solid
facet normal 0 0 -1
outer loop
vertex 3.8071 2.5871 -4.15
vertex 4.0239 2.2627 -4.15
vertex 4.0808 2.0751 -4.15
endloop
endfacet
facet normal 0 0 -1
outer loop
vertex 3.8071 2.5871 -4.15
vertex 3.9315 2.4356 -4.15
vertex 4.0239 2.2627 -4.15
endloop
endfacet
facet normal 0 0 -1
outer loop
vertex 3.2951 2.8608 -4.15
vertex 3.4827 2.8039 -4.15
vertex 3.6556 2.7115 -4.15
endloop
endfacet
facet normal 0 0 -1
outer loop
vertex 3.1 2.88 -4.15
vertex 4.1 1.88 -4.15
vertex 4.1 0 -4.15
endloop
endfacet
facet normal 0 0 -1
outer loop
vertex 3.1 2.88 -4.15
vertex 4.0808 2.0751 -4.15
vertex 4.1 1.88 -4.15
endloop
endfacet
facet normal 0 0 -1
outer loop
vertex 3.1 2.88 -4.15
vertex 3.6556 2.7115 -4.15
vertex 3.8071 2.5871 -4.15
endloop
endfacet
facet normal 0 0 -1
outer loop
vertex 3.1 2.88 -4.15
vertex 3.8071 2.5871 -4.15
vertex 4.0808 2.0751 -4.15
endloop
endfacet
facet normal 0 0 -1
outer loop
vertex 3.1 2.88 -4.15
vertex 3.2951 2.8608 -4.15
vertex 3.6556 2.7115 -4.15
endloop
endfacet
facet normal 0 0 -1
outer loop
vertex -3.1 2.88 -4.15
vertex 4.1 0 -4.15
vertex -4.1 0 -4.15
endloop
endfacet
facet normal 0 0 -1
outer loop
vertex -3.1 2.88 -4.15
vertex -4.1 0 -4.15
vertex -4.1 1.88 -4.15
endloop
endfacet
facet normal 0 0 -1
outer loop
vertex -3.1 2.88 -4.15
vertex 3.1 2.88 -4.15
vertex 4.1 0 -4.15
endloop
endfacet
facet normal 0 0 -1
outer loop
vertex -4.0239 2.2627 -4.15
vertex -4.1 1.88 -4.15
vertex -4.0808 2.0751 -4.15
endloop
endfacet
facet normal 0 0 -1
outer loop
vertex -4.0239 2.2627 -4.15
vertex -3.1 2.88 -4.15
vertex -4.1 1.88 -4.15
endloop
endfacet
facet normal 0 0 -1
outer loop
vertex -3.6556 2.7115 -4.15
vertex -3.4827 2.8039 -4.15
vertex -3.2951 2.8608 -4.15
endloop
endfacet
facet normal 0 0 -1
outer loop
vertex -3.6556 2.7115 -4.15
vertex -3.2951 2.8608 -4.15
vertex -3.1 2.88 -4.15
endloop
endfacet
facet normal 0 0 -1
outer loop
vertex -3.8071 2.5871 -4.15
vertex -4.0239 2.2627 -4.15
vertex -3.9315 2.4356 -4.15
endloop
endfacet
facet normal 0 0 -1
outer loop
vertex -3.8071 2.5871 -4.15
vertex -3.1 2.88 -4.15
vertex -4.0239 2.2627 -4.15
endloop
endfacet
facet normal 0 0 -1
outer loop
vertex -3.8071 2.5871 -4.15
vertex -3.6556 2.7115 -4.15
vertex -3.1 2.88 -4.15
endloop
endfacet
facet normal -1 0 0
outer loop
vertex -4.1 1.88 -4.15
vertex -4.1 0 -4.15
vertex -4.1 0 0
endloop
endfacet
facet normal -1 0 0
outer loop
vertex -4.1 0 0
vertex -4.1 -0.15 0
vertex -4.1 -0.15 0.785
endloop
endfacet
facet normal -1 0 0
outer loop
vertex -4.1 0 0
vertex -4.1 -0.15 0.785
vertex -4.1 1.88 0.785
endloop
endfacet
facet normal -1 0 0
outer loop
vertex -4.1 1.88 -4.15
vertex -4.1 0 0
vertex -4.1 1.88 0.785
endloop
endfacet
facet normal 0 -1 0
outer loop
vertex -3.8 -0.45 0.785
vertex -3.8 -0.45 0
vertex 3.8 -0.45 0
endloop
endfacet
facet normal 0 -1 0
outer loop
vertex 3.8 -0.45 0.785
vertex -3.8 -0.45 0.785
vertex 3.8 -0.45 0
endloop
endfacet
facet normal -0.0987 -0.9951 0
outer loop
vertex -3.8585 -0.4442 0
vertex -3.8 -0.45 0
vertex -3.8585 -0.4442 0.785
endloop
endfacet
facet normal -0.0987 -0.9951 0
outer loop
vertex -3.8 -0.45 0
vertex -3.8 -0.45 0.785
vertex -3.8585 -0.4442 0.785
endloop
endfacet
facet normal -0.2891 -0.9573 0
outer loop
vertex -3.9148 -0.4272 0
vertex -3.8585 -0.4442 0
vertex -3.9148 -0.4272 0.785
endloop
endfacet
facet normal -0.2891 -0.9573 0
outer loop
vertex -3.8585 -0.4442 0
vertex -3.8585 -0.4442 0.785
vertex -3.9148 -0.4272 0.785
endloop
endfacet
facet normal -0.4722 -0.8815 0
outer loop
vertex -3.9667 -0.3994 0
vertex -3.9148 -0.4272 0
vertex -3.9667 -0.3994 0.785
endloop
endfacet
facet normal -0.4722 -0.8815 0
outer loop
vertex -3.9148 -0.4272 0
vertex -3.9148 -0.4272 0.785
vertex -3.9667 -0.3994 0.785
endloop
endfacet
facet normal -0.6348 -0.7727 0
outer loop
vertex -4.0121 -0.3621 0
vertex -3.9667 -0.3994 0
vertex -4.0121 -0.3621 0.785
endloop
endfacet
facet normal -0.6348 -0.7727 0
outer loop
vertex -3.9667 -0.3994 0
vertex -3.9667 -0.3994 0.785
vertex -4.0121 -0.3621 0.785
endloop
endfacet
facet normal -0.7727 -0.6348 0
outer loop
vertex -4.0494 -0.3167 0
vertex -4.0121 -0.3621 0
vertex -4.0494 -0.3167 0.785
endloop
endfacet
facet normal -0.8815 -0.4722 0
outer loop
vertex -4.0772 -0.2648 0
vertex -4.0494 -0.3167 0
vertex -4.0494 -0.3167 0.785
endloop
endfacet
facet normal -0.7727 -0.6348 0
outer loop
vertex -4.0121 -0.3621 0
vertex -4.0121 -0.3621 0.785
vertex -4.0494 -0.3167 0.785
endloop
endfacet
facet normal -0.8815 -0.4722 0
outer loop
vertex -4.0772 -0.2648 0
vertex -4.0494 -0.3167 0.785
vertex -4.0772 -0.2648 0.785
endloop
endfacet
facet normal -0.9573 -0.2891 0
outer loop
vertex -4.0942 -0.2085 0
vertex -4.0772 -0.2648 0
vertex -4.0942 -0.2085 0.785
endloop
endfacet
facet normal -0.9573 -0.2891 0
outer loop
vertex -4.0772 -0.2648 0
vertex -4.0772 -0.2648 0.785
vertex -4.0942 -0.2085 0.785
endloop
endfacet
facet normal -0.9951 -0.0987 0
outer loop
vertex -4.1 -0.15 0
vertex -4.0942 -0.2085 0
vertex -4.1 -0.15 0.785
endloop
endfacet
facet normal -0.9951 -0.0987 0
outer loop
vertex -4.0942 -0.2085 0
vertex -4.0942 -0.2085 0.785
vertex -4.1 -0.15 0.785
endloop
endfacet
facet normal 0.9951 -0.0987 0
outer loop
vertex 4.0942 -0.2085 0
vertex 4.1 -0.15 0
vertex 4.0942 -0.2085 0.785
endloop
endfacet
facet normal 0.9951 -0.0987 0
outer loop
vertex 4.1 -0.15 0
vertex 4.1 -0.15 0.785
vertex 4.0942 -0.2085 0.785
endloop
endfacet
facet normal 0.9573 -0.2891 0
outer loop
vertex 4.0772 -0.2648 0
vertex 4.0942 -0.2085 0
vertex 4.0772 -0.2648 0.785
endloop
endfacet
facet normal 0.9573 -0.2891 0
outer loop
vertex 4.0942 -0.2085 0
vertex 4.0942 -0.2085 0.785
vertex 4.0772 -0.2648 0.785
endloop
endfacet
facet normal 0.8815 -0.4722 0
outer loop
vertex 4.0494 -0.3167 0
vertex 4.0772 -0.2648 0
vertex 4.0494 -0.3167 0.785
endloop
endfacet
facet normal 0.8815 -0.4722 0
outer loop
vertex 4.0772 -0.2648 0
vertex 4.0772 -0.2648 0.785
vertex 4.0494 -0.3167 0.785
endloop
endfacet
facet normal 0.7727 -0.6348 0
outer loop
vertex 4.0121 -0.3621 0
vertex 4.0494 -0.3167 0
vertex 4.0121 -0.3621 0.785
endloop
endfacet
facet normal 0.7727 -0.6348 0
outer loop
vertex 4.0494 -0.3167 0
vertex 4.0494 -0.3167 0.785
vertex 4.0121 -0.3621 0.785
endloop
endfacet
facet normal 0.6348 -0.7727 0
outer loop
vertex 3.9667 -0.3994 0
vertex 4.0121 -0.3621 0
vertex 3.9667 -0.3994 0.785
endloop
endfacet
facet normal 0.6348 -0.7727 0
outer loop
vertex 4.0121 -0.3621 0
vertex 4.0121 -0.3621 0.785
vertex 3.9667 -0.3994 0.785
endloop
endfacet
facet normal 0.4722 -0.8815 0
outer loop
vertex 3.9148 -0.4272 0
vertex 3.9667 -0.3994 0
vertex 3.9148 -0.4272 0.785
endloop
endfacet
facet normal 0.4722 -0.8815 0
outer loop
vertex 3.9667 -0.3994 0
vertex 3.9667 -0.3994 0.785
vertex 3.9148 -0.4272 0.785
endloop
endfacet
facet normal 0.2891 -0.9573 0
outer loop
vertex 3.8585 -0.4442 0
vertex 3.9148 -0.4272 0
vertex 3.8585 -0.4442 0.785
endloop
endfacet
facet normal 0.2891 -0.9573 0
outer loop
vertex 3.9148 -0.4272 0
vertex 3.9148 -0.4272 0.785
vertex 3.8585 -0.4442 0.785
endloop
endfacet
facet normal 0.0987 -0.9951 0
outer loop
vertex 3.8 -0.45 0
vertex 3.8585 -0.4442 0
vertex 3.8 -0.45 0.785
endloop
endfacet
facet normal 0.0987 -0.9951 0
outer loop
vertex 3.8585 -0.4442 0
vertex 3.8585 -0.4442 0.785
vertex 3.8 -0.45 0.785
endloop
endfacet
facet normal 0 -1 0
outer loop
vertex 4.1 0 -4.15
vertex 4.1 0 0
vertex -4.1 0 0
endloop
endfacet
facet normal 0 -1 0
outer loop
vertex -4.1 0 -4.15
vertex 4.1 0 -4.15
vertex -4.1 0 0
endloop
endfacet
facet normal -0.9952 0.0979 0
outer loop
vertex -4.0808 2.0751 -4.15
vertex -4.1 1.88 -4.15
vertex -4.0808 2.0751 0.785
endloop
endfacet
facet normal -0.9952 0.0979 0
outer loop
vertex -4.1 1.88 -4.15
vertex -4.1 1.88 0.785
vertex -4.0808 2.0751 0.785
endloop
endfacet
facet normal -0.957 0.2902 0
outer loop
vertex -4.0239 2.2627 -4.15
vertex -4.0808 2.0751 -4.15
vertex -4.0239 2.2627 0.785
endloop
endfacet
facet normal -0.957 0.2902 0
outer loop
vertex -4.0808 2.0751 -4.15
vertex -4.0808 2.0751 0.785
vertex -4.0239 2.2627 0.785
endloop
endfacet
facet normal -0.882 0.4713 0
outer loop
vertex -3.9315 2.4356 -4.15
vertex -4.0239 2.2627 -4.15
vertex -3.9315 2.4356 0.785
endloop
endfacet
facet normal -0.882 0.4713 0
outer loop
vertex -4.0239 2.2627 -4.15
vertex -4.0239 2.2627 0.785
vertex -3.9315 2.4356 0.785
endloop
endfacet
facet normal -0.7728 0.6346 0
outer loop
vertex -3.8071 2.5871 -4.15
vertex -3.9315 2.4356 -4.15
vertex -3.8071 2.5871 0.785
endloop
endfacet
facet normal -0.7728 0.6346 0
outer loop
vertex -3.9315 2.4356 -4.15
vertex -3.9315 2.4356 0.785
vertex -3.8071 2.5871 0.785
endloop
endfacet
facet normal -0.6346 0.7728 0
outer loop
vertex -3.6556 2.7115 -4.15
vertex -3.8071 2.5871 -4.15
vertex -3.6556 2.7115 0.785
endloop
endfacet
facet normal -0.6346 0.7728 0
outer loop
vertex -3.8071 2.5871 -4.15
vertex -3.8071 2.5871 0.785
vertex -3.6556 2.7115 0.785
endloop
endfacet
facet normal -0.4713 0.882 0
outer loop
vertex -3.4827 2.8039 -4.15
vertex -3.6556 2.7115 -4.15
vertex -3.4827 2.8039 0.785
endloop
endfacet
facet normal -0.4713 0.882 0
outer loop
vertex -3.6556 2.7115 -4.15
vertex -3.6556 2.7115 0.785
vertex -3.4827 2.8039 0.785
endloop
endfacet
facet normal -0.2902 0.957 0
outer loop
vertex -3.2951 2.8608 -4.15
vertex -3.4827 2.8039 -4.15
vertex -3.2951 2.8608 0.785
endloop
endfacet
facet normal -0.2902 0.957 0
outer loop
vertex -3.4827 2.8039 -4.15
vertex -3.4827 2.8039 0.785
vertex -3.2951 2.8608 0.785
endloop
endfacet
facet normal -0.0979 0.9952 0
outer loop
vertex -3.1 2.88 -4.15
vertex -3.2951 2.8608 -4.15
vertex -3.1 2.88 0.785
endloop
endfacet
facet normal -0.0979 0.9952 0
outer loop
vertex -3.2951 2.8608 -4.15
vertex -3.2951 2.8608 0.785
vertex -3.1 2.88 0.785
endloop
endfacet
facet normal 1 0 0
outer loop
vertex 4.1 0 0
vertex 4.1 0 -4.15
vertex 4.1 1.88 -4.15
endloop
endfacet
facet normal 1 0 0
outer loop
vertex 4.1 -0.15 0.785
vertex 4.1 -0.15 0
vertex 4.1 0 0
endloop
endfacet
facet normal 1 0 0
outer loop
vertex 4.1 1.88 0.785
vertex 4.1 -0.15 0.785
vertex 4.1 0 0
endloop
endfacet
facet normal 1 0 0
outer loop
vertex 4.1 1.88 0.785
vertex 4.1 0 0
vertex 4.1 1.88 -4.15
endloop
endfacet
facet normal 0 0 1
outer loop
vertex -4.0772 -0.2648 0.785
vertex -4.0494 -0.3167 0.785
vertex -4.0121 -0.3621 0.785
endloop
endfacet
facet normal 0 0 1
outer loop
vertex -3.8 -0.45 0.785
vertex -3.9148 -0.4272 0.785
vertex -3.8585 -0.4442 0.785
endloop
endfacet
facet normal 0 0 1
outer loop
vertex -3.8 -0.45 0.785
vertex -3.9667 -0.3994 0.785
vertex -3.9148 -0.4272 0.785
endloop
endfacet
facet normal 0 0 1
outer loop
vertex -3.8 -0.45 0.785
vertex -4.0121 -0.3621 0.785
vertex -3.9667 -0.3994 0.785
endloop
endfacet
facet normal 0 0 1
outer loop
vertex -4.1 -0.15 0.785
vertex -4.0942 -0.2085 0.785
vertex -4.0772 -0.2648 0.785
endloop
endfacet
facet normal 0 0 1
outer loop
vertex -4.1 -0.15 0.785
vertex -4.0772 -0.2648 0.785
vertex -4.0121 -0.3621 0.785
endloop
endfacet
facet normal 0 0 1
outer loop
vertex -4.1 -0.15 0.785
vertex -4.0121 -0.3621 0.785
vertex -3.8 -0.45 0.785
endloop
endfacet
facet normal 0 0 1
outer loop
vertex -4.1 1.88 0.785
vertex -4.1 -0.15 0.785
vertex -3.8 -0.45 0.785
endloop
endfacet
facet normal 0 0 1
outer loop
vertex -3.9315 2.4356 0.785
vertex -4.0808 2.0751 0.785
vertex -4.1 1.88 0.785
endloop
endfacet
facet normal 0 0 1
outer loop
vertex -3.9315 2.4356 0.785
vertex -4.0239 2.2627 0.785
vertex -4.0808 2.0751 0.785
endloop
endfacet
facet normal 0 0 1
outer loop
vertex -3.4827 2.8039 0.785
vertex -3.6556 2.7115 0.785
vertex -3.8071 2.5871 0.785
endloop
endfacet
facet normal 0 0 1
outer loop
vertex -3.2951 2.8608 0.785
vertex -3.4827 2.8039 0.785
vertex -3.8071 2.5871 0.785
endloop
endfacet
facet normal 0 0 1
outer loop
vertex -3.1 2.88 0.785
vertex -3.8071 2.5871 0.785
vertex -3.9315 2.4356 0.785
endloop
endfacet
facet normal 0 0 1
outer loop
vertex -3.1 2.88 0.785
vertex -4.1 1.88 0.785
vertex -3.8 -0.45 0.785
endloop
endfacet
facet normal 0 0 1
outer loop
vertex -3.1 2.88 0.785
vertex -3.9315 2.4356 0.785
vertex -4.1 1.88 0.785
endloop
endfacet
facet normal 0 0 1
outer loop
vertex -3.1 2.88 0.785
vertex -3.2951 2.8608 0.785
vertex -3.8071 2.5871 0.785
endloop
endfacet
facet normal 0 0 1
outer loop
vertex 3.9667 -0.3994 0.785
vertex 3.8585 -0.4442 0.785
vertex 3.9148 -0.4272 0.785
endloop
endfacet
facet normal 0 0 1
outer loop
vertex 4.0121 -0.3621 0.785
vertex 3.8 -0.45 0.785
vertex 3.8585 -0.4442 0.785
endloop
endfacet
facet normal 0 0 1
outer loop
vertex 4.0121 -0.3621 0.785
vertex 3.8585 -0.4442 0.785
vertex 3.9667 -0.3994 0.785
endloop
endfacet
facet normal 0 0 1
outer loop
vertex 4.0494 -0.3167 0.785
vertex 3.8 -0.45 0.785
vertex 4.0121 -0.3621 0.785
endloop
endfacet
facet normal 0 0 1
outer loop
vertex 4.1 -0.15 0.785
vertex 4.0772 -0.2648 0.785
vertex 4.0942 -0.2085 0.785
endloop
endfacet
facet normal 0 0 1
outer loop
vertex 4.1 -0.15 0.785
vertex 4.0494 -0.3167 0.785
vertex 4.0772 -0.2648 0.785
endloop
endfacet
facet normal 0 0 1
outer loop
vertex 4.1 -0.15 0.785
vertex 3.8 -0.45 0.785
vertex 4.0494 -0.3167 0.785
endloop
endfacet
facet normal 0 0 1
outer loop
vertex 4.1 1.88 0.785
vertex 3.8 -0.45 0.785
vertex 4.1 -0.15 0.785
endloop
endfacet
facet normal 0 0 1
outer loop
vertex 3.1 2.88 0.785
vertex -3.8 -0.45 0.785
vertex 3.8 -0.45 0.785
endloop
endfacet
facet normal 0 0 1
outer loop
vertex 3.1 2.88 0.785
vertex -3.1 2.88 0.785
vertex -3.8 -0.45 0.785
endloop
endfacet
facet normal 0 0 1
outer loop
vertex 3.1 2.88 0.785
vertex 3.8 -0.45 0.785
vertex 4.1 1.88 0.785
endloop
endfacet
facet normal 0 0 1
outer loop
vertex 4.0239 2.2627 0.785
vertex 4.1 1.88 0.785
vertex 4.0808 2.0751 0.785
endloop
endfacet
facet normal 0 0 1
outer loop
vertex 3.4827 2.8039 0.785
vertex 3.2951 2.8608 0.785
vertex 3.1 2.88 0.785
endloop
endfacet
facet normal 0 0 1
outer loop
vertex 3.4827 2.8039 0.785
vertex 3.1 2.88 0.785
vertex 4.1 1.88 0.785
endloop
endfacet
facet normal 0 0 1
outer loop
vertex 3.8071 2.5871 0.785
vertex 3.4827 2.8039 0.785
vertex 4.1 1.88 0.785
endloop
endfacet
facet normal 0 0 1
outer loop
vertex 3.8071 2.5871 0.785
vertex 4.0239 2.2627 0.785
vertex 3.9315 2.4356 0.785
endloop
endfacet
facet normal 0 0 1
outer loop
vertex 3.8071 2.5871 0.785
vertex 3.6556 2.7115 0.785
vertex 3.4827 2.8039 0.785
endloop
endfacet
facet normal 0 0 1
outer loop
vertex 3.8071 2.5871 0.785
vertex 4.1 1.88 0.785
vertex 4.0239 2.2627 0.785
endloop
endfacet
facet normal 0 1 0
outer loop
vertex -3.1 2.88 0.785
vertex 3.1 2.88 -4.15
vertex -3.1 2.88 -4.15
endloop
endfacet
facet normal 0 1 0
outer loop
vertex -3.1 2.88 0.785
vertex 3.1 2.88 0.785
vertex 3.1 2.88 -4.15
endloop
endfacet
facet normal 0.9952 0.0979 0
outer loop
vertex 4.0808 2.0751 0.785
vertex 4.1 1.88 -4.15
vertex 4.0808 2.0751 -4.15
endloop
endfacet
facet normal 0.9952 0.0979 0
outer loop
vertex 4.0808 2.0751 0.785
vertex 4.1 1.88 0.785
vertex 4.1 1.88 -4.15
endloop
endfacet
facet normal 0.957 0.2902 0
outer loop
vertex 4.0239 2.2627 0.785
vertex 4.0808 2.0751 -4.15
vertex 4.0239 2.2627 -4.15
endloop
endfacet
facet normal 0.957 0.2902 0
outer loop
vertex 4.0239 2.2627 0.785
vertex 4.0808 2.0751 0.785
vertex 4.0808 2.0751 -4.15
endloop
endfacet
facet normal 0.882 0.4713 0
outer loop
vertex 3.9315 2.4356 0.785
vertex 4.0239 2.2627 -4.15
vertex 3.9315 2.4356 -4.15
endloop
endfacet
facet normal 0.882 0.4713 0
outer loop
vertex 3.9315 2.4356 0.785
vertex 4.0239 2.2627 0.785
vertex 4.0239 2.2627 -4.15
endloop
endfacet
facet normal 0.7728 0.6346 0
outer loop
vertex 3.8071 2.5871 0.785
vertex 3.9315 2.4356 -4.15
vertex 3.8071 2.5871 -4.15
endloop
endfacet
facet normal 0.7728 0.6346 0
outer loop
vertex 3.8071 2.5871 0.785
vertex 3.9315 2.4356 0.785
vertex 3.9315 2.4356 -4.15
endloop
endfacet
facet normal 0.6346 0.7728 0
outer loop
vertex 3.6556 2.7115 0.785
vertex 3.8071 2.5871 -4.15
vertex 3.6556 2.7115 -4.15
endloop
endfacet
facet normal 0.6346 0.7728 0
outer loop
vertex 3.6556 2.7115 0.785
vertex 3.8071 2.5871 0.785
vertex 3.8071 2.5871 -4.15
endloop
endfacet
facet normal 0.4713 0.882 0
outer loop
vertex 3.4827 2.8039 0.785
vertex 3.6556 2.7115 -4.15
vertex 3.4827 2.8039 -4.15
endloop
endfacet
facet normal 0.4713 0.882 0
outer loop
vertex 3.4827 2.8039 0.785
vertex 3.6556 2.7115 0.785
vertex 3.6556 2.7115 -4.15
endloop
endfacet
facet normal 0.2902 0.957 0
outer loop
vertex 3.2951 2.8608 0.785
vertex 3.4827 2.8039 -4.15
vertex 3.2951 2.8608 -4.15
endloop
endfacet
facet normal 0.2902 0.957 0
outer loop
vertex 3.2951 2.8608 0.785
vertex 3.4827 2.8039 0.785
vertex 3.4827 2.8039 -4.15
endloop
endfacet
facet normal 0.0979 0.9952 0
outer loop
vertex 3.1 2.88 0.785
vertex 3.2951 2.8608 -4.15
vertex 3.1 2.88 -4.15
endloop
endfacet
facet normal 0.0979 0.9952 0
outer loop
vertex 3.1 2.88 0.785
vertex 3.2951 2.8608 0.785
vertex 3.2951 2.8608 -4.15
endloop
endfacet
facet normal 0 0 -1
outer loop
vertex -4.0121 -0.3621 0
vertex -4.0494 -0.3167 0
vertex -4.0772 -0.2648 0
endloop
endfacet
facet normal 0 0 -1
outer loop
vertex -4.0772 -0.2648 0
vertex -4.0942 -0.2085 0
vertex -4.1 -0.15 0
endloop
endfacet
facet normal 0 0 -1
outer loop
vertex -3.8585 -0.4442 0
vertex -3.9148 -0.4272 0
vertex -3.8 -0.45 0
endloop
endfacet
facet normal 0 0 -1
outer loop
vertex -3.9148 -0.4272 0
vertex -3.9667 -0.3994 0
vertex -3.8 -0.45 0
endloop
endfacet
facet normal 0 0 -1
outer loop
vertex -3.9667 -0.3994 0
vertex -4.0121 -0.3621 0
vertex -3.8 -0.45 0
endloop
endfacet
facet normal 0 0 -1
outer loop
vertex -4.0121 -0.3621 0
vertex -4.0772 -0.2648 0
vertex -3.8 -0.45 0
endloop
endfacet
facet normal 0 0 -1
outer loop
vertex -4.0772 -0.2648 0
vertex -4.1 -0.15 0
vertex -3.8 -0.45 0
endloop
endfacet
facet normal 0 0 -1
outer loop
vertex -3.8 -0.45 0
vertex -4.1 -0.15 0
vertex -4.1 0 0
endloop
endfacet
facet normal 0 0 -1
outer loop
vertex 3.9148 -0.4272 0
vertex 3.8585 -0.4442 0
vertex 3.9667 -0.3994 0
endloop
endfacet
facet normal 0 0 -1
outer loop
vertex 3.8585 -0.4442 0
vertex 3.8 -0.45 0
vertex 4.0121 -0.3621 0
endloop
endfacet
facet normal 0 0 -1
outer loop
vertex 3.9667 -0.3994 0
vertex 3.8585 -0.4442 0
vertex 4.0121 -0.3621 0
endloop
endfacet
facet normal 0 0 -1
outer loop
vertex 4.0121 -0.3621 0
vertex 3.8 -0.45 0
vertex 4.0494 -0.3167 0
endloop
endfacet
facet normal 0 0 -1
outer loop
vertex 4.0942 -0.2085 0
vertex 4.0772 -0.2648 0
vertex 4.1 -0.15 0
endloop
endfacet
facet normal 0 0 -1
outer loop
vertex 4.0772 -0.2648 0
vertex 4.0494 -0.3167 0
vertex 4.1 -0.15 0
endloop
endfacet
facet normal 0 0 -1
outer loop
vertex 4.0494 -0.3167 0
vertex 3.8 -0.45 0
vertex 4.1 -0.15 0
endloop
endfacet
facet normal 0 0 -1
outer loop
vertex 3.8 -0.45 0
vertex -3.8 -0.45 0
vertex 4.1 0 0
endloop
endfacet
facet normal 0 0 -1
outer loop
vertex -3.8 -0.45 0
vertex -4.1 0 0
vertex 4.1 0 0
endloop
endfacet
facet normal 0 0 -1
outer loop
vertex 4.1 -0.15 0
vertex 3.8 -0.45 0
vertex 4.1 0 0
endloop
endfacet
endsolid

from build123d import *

# Parameters (mm, degrees)
SKETCH1_W           = 8.2
SKETCH1_H           = 3.33
BOSS_EXTRUDE1_DEPTH = 0.785
SKETCH2_W           = 8.2
SKETCH2_H           = 2.88
BOSS_EXTRUDE2_DEPTH = 4.15
FILLET1_R           = 1
FILLET2_R           = 0.3


with BuildPart() as part:
    # Sketch1 → Boss-Extrude1 (new body)
    with BuildSketch(Plane.XY):
        with Locations((0, 1.215)):
            Rectangle(SKETCH1_W, SKETCH1_H)
    extrude(amount=BOSS_EXTRUDE1_DEPTH)

    # Sketch2 → Boss-Extrude2 (add)
    with BuildSketch(Plane(origin=(0, 0, 0), x_dir=(-1, 0, 0), z_dir=(0, 0, -1))):
        with Locations((0, 1.44)):
            Rectangle(SKETCH2_W, SKETCH2_H)
    extrude(amount=BOSS_EXTRUDE2_DEPTH)

    # Fillet1
    fillet1_edges = [part.edges().sort_by_distance(p)[0] for p in [
        (-4.1, 2.88, -1.6825),
        (4.1, 2.88, -1.6825),
    ]]
    fillet(fillet1_edges, radius=FILLET1_R)

    # Fillet2
    fillet2_edges = [part.edges().sort_by_distance(p)[0] for p in [
        (4.1, -0.45, 0.3925),
        (-4.1, -0.45, 0.3925),
    ]]
    fillet(fillet2_edges, radius=FILLET2_R)


solid = part.part
